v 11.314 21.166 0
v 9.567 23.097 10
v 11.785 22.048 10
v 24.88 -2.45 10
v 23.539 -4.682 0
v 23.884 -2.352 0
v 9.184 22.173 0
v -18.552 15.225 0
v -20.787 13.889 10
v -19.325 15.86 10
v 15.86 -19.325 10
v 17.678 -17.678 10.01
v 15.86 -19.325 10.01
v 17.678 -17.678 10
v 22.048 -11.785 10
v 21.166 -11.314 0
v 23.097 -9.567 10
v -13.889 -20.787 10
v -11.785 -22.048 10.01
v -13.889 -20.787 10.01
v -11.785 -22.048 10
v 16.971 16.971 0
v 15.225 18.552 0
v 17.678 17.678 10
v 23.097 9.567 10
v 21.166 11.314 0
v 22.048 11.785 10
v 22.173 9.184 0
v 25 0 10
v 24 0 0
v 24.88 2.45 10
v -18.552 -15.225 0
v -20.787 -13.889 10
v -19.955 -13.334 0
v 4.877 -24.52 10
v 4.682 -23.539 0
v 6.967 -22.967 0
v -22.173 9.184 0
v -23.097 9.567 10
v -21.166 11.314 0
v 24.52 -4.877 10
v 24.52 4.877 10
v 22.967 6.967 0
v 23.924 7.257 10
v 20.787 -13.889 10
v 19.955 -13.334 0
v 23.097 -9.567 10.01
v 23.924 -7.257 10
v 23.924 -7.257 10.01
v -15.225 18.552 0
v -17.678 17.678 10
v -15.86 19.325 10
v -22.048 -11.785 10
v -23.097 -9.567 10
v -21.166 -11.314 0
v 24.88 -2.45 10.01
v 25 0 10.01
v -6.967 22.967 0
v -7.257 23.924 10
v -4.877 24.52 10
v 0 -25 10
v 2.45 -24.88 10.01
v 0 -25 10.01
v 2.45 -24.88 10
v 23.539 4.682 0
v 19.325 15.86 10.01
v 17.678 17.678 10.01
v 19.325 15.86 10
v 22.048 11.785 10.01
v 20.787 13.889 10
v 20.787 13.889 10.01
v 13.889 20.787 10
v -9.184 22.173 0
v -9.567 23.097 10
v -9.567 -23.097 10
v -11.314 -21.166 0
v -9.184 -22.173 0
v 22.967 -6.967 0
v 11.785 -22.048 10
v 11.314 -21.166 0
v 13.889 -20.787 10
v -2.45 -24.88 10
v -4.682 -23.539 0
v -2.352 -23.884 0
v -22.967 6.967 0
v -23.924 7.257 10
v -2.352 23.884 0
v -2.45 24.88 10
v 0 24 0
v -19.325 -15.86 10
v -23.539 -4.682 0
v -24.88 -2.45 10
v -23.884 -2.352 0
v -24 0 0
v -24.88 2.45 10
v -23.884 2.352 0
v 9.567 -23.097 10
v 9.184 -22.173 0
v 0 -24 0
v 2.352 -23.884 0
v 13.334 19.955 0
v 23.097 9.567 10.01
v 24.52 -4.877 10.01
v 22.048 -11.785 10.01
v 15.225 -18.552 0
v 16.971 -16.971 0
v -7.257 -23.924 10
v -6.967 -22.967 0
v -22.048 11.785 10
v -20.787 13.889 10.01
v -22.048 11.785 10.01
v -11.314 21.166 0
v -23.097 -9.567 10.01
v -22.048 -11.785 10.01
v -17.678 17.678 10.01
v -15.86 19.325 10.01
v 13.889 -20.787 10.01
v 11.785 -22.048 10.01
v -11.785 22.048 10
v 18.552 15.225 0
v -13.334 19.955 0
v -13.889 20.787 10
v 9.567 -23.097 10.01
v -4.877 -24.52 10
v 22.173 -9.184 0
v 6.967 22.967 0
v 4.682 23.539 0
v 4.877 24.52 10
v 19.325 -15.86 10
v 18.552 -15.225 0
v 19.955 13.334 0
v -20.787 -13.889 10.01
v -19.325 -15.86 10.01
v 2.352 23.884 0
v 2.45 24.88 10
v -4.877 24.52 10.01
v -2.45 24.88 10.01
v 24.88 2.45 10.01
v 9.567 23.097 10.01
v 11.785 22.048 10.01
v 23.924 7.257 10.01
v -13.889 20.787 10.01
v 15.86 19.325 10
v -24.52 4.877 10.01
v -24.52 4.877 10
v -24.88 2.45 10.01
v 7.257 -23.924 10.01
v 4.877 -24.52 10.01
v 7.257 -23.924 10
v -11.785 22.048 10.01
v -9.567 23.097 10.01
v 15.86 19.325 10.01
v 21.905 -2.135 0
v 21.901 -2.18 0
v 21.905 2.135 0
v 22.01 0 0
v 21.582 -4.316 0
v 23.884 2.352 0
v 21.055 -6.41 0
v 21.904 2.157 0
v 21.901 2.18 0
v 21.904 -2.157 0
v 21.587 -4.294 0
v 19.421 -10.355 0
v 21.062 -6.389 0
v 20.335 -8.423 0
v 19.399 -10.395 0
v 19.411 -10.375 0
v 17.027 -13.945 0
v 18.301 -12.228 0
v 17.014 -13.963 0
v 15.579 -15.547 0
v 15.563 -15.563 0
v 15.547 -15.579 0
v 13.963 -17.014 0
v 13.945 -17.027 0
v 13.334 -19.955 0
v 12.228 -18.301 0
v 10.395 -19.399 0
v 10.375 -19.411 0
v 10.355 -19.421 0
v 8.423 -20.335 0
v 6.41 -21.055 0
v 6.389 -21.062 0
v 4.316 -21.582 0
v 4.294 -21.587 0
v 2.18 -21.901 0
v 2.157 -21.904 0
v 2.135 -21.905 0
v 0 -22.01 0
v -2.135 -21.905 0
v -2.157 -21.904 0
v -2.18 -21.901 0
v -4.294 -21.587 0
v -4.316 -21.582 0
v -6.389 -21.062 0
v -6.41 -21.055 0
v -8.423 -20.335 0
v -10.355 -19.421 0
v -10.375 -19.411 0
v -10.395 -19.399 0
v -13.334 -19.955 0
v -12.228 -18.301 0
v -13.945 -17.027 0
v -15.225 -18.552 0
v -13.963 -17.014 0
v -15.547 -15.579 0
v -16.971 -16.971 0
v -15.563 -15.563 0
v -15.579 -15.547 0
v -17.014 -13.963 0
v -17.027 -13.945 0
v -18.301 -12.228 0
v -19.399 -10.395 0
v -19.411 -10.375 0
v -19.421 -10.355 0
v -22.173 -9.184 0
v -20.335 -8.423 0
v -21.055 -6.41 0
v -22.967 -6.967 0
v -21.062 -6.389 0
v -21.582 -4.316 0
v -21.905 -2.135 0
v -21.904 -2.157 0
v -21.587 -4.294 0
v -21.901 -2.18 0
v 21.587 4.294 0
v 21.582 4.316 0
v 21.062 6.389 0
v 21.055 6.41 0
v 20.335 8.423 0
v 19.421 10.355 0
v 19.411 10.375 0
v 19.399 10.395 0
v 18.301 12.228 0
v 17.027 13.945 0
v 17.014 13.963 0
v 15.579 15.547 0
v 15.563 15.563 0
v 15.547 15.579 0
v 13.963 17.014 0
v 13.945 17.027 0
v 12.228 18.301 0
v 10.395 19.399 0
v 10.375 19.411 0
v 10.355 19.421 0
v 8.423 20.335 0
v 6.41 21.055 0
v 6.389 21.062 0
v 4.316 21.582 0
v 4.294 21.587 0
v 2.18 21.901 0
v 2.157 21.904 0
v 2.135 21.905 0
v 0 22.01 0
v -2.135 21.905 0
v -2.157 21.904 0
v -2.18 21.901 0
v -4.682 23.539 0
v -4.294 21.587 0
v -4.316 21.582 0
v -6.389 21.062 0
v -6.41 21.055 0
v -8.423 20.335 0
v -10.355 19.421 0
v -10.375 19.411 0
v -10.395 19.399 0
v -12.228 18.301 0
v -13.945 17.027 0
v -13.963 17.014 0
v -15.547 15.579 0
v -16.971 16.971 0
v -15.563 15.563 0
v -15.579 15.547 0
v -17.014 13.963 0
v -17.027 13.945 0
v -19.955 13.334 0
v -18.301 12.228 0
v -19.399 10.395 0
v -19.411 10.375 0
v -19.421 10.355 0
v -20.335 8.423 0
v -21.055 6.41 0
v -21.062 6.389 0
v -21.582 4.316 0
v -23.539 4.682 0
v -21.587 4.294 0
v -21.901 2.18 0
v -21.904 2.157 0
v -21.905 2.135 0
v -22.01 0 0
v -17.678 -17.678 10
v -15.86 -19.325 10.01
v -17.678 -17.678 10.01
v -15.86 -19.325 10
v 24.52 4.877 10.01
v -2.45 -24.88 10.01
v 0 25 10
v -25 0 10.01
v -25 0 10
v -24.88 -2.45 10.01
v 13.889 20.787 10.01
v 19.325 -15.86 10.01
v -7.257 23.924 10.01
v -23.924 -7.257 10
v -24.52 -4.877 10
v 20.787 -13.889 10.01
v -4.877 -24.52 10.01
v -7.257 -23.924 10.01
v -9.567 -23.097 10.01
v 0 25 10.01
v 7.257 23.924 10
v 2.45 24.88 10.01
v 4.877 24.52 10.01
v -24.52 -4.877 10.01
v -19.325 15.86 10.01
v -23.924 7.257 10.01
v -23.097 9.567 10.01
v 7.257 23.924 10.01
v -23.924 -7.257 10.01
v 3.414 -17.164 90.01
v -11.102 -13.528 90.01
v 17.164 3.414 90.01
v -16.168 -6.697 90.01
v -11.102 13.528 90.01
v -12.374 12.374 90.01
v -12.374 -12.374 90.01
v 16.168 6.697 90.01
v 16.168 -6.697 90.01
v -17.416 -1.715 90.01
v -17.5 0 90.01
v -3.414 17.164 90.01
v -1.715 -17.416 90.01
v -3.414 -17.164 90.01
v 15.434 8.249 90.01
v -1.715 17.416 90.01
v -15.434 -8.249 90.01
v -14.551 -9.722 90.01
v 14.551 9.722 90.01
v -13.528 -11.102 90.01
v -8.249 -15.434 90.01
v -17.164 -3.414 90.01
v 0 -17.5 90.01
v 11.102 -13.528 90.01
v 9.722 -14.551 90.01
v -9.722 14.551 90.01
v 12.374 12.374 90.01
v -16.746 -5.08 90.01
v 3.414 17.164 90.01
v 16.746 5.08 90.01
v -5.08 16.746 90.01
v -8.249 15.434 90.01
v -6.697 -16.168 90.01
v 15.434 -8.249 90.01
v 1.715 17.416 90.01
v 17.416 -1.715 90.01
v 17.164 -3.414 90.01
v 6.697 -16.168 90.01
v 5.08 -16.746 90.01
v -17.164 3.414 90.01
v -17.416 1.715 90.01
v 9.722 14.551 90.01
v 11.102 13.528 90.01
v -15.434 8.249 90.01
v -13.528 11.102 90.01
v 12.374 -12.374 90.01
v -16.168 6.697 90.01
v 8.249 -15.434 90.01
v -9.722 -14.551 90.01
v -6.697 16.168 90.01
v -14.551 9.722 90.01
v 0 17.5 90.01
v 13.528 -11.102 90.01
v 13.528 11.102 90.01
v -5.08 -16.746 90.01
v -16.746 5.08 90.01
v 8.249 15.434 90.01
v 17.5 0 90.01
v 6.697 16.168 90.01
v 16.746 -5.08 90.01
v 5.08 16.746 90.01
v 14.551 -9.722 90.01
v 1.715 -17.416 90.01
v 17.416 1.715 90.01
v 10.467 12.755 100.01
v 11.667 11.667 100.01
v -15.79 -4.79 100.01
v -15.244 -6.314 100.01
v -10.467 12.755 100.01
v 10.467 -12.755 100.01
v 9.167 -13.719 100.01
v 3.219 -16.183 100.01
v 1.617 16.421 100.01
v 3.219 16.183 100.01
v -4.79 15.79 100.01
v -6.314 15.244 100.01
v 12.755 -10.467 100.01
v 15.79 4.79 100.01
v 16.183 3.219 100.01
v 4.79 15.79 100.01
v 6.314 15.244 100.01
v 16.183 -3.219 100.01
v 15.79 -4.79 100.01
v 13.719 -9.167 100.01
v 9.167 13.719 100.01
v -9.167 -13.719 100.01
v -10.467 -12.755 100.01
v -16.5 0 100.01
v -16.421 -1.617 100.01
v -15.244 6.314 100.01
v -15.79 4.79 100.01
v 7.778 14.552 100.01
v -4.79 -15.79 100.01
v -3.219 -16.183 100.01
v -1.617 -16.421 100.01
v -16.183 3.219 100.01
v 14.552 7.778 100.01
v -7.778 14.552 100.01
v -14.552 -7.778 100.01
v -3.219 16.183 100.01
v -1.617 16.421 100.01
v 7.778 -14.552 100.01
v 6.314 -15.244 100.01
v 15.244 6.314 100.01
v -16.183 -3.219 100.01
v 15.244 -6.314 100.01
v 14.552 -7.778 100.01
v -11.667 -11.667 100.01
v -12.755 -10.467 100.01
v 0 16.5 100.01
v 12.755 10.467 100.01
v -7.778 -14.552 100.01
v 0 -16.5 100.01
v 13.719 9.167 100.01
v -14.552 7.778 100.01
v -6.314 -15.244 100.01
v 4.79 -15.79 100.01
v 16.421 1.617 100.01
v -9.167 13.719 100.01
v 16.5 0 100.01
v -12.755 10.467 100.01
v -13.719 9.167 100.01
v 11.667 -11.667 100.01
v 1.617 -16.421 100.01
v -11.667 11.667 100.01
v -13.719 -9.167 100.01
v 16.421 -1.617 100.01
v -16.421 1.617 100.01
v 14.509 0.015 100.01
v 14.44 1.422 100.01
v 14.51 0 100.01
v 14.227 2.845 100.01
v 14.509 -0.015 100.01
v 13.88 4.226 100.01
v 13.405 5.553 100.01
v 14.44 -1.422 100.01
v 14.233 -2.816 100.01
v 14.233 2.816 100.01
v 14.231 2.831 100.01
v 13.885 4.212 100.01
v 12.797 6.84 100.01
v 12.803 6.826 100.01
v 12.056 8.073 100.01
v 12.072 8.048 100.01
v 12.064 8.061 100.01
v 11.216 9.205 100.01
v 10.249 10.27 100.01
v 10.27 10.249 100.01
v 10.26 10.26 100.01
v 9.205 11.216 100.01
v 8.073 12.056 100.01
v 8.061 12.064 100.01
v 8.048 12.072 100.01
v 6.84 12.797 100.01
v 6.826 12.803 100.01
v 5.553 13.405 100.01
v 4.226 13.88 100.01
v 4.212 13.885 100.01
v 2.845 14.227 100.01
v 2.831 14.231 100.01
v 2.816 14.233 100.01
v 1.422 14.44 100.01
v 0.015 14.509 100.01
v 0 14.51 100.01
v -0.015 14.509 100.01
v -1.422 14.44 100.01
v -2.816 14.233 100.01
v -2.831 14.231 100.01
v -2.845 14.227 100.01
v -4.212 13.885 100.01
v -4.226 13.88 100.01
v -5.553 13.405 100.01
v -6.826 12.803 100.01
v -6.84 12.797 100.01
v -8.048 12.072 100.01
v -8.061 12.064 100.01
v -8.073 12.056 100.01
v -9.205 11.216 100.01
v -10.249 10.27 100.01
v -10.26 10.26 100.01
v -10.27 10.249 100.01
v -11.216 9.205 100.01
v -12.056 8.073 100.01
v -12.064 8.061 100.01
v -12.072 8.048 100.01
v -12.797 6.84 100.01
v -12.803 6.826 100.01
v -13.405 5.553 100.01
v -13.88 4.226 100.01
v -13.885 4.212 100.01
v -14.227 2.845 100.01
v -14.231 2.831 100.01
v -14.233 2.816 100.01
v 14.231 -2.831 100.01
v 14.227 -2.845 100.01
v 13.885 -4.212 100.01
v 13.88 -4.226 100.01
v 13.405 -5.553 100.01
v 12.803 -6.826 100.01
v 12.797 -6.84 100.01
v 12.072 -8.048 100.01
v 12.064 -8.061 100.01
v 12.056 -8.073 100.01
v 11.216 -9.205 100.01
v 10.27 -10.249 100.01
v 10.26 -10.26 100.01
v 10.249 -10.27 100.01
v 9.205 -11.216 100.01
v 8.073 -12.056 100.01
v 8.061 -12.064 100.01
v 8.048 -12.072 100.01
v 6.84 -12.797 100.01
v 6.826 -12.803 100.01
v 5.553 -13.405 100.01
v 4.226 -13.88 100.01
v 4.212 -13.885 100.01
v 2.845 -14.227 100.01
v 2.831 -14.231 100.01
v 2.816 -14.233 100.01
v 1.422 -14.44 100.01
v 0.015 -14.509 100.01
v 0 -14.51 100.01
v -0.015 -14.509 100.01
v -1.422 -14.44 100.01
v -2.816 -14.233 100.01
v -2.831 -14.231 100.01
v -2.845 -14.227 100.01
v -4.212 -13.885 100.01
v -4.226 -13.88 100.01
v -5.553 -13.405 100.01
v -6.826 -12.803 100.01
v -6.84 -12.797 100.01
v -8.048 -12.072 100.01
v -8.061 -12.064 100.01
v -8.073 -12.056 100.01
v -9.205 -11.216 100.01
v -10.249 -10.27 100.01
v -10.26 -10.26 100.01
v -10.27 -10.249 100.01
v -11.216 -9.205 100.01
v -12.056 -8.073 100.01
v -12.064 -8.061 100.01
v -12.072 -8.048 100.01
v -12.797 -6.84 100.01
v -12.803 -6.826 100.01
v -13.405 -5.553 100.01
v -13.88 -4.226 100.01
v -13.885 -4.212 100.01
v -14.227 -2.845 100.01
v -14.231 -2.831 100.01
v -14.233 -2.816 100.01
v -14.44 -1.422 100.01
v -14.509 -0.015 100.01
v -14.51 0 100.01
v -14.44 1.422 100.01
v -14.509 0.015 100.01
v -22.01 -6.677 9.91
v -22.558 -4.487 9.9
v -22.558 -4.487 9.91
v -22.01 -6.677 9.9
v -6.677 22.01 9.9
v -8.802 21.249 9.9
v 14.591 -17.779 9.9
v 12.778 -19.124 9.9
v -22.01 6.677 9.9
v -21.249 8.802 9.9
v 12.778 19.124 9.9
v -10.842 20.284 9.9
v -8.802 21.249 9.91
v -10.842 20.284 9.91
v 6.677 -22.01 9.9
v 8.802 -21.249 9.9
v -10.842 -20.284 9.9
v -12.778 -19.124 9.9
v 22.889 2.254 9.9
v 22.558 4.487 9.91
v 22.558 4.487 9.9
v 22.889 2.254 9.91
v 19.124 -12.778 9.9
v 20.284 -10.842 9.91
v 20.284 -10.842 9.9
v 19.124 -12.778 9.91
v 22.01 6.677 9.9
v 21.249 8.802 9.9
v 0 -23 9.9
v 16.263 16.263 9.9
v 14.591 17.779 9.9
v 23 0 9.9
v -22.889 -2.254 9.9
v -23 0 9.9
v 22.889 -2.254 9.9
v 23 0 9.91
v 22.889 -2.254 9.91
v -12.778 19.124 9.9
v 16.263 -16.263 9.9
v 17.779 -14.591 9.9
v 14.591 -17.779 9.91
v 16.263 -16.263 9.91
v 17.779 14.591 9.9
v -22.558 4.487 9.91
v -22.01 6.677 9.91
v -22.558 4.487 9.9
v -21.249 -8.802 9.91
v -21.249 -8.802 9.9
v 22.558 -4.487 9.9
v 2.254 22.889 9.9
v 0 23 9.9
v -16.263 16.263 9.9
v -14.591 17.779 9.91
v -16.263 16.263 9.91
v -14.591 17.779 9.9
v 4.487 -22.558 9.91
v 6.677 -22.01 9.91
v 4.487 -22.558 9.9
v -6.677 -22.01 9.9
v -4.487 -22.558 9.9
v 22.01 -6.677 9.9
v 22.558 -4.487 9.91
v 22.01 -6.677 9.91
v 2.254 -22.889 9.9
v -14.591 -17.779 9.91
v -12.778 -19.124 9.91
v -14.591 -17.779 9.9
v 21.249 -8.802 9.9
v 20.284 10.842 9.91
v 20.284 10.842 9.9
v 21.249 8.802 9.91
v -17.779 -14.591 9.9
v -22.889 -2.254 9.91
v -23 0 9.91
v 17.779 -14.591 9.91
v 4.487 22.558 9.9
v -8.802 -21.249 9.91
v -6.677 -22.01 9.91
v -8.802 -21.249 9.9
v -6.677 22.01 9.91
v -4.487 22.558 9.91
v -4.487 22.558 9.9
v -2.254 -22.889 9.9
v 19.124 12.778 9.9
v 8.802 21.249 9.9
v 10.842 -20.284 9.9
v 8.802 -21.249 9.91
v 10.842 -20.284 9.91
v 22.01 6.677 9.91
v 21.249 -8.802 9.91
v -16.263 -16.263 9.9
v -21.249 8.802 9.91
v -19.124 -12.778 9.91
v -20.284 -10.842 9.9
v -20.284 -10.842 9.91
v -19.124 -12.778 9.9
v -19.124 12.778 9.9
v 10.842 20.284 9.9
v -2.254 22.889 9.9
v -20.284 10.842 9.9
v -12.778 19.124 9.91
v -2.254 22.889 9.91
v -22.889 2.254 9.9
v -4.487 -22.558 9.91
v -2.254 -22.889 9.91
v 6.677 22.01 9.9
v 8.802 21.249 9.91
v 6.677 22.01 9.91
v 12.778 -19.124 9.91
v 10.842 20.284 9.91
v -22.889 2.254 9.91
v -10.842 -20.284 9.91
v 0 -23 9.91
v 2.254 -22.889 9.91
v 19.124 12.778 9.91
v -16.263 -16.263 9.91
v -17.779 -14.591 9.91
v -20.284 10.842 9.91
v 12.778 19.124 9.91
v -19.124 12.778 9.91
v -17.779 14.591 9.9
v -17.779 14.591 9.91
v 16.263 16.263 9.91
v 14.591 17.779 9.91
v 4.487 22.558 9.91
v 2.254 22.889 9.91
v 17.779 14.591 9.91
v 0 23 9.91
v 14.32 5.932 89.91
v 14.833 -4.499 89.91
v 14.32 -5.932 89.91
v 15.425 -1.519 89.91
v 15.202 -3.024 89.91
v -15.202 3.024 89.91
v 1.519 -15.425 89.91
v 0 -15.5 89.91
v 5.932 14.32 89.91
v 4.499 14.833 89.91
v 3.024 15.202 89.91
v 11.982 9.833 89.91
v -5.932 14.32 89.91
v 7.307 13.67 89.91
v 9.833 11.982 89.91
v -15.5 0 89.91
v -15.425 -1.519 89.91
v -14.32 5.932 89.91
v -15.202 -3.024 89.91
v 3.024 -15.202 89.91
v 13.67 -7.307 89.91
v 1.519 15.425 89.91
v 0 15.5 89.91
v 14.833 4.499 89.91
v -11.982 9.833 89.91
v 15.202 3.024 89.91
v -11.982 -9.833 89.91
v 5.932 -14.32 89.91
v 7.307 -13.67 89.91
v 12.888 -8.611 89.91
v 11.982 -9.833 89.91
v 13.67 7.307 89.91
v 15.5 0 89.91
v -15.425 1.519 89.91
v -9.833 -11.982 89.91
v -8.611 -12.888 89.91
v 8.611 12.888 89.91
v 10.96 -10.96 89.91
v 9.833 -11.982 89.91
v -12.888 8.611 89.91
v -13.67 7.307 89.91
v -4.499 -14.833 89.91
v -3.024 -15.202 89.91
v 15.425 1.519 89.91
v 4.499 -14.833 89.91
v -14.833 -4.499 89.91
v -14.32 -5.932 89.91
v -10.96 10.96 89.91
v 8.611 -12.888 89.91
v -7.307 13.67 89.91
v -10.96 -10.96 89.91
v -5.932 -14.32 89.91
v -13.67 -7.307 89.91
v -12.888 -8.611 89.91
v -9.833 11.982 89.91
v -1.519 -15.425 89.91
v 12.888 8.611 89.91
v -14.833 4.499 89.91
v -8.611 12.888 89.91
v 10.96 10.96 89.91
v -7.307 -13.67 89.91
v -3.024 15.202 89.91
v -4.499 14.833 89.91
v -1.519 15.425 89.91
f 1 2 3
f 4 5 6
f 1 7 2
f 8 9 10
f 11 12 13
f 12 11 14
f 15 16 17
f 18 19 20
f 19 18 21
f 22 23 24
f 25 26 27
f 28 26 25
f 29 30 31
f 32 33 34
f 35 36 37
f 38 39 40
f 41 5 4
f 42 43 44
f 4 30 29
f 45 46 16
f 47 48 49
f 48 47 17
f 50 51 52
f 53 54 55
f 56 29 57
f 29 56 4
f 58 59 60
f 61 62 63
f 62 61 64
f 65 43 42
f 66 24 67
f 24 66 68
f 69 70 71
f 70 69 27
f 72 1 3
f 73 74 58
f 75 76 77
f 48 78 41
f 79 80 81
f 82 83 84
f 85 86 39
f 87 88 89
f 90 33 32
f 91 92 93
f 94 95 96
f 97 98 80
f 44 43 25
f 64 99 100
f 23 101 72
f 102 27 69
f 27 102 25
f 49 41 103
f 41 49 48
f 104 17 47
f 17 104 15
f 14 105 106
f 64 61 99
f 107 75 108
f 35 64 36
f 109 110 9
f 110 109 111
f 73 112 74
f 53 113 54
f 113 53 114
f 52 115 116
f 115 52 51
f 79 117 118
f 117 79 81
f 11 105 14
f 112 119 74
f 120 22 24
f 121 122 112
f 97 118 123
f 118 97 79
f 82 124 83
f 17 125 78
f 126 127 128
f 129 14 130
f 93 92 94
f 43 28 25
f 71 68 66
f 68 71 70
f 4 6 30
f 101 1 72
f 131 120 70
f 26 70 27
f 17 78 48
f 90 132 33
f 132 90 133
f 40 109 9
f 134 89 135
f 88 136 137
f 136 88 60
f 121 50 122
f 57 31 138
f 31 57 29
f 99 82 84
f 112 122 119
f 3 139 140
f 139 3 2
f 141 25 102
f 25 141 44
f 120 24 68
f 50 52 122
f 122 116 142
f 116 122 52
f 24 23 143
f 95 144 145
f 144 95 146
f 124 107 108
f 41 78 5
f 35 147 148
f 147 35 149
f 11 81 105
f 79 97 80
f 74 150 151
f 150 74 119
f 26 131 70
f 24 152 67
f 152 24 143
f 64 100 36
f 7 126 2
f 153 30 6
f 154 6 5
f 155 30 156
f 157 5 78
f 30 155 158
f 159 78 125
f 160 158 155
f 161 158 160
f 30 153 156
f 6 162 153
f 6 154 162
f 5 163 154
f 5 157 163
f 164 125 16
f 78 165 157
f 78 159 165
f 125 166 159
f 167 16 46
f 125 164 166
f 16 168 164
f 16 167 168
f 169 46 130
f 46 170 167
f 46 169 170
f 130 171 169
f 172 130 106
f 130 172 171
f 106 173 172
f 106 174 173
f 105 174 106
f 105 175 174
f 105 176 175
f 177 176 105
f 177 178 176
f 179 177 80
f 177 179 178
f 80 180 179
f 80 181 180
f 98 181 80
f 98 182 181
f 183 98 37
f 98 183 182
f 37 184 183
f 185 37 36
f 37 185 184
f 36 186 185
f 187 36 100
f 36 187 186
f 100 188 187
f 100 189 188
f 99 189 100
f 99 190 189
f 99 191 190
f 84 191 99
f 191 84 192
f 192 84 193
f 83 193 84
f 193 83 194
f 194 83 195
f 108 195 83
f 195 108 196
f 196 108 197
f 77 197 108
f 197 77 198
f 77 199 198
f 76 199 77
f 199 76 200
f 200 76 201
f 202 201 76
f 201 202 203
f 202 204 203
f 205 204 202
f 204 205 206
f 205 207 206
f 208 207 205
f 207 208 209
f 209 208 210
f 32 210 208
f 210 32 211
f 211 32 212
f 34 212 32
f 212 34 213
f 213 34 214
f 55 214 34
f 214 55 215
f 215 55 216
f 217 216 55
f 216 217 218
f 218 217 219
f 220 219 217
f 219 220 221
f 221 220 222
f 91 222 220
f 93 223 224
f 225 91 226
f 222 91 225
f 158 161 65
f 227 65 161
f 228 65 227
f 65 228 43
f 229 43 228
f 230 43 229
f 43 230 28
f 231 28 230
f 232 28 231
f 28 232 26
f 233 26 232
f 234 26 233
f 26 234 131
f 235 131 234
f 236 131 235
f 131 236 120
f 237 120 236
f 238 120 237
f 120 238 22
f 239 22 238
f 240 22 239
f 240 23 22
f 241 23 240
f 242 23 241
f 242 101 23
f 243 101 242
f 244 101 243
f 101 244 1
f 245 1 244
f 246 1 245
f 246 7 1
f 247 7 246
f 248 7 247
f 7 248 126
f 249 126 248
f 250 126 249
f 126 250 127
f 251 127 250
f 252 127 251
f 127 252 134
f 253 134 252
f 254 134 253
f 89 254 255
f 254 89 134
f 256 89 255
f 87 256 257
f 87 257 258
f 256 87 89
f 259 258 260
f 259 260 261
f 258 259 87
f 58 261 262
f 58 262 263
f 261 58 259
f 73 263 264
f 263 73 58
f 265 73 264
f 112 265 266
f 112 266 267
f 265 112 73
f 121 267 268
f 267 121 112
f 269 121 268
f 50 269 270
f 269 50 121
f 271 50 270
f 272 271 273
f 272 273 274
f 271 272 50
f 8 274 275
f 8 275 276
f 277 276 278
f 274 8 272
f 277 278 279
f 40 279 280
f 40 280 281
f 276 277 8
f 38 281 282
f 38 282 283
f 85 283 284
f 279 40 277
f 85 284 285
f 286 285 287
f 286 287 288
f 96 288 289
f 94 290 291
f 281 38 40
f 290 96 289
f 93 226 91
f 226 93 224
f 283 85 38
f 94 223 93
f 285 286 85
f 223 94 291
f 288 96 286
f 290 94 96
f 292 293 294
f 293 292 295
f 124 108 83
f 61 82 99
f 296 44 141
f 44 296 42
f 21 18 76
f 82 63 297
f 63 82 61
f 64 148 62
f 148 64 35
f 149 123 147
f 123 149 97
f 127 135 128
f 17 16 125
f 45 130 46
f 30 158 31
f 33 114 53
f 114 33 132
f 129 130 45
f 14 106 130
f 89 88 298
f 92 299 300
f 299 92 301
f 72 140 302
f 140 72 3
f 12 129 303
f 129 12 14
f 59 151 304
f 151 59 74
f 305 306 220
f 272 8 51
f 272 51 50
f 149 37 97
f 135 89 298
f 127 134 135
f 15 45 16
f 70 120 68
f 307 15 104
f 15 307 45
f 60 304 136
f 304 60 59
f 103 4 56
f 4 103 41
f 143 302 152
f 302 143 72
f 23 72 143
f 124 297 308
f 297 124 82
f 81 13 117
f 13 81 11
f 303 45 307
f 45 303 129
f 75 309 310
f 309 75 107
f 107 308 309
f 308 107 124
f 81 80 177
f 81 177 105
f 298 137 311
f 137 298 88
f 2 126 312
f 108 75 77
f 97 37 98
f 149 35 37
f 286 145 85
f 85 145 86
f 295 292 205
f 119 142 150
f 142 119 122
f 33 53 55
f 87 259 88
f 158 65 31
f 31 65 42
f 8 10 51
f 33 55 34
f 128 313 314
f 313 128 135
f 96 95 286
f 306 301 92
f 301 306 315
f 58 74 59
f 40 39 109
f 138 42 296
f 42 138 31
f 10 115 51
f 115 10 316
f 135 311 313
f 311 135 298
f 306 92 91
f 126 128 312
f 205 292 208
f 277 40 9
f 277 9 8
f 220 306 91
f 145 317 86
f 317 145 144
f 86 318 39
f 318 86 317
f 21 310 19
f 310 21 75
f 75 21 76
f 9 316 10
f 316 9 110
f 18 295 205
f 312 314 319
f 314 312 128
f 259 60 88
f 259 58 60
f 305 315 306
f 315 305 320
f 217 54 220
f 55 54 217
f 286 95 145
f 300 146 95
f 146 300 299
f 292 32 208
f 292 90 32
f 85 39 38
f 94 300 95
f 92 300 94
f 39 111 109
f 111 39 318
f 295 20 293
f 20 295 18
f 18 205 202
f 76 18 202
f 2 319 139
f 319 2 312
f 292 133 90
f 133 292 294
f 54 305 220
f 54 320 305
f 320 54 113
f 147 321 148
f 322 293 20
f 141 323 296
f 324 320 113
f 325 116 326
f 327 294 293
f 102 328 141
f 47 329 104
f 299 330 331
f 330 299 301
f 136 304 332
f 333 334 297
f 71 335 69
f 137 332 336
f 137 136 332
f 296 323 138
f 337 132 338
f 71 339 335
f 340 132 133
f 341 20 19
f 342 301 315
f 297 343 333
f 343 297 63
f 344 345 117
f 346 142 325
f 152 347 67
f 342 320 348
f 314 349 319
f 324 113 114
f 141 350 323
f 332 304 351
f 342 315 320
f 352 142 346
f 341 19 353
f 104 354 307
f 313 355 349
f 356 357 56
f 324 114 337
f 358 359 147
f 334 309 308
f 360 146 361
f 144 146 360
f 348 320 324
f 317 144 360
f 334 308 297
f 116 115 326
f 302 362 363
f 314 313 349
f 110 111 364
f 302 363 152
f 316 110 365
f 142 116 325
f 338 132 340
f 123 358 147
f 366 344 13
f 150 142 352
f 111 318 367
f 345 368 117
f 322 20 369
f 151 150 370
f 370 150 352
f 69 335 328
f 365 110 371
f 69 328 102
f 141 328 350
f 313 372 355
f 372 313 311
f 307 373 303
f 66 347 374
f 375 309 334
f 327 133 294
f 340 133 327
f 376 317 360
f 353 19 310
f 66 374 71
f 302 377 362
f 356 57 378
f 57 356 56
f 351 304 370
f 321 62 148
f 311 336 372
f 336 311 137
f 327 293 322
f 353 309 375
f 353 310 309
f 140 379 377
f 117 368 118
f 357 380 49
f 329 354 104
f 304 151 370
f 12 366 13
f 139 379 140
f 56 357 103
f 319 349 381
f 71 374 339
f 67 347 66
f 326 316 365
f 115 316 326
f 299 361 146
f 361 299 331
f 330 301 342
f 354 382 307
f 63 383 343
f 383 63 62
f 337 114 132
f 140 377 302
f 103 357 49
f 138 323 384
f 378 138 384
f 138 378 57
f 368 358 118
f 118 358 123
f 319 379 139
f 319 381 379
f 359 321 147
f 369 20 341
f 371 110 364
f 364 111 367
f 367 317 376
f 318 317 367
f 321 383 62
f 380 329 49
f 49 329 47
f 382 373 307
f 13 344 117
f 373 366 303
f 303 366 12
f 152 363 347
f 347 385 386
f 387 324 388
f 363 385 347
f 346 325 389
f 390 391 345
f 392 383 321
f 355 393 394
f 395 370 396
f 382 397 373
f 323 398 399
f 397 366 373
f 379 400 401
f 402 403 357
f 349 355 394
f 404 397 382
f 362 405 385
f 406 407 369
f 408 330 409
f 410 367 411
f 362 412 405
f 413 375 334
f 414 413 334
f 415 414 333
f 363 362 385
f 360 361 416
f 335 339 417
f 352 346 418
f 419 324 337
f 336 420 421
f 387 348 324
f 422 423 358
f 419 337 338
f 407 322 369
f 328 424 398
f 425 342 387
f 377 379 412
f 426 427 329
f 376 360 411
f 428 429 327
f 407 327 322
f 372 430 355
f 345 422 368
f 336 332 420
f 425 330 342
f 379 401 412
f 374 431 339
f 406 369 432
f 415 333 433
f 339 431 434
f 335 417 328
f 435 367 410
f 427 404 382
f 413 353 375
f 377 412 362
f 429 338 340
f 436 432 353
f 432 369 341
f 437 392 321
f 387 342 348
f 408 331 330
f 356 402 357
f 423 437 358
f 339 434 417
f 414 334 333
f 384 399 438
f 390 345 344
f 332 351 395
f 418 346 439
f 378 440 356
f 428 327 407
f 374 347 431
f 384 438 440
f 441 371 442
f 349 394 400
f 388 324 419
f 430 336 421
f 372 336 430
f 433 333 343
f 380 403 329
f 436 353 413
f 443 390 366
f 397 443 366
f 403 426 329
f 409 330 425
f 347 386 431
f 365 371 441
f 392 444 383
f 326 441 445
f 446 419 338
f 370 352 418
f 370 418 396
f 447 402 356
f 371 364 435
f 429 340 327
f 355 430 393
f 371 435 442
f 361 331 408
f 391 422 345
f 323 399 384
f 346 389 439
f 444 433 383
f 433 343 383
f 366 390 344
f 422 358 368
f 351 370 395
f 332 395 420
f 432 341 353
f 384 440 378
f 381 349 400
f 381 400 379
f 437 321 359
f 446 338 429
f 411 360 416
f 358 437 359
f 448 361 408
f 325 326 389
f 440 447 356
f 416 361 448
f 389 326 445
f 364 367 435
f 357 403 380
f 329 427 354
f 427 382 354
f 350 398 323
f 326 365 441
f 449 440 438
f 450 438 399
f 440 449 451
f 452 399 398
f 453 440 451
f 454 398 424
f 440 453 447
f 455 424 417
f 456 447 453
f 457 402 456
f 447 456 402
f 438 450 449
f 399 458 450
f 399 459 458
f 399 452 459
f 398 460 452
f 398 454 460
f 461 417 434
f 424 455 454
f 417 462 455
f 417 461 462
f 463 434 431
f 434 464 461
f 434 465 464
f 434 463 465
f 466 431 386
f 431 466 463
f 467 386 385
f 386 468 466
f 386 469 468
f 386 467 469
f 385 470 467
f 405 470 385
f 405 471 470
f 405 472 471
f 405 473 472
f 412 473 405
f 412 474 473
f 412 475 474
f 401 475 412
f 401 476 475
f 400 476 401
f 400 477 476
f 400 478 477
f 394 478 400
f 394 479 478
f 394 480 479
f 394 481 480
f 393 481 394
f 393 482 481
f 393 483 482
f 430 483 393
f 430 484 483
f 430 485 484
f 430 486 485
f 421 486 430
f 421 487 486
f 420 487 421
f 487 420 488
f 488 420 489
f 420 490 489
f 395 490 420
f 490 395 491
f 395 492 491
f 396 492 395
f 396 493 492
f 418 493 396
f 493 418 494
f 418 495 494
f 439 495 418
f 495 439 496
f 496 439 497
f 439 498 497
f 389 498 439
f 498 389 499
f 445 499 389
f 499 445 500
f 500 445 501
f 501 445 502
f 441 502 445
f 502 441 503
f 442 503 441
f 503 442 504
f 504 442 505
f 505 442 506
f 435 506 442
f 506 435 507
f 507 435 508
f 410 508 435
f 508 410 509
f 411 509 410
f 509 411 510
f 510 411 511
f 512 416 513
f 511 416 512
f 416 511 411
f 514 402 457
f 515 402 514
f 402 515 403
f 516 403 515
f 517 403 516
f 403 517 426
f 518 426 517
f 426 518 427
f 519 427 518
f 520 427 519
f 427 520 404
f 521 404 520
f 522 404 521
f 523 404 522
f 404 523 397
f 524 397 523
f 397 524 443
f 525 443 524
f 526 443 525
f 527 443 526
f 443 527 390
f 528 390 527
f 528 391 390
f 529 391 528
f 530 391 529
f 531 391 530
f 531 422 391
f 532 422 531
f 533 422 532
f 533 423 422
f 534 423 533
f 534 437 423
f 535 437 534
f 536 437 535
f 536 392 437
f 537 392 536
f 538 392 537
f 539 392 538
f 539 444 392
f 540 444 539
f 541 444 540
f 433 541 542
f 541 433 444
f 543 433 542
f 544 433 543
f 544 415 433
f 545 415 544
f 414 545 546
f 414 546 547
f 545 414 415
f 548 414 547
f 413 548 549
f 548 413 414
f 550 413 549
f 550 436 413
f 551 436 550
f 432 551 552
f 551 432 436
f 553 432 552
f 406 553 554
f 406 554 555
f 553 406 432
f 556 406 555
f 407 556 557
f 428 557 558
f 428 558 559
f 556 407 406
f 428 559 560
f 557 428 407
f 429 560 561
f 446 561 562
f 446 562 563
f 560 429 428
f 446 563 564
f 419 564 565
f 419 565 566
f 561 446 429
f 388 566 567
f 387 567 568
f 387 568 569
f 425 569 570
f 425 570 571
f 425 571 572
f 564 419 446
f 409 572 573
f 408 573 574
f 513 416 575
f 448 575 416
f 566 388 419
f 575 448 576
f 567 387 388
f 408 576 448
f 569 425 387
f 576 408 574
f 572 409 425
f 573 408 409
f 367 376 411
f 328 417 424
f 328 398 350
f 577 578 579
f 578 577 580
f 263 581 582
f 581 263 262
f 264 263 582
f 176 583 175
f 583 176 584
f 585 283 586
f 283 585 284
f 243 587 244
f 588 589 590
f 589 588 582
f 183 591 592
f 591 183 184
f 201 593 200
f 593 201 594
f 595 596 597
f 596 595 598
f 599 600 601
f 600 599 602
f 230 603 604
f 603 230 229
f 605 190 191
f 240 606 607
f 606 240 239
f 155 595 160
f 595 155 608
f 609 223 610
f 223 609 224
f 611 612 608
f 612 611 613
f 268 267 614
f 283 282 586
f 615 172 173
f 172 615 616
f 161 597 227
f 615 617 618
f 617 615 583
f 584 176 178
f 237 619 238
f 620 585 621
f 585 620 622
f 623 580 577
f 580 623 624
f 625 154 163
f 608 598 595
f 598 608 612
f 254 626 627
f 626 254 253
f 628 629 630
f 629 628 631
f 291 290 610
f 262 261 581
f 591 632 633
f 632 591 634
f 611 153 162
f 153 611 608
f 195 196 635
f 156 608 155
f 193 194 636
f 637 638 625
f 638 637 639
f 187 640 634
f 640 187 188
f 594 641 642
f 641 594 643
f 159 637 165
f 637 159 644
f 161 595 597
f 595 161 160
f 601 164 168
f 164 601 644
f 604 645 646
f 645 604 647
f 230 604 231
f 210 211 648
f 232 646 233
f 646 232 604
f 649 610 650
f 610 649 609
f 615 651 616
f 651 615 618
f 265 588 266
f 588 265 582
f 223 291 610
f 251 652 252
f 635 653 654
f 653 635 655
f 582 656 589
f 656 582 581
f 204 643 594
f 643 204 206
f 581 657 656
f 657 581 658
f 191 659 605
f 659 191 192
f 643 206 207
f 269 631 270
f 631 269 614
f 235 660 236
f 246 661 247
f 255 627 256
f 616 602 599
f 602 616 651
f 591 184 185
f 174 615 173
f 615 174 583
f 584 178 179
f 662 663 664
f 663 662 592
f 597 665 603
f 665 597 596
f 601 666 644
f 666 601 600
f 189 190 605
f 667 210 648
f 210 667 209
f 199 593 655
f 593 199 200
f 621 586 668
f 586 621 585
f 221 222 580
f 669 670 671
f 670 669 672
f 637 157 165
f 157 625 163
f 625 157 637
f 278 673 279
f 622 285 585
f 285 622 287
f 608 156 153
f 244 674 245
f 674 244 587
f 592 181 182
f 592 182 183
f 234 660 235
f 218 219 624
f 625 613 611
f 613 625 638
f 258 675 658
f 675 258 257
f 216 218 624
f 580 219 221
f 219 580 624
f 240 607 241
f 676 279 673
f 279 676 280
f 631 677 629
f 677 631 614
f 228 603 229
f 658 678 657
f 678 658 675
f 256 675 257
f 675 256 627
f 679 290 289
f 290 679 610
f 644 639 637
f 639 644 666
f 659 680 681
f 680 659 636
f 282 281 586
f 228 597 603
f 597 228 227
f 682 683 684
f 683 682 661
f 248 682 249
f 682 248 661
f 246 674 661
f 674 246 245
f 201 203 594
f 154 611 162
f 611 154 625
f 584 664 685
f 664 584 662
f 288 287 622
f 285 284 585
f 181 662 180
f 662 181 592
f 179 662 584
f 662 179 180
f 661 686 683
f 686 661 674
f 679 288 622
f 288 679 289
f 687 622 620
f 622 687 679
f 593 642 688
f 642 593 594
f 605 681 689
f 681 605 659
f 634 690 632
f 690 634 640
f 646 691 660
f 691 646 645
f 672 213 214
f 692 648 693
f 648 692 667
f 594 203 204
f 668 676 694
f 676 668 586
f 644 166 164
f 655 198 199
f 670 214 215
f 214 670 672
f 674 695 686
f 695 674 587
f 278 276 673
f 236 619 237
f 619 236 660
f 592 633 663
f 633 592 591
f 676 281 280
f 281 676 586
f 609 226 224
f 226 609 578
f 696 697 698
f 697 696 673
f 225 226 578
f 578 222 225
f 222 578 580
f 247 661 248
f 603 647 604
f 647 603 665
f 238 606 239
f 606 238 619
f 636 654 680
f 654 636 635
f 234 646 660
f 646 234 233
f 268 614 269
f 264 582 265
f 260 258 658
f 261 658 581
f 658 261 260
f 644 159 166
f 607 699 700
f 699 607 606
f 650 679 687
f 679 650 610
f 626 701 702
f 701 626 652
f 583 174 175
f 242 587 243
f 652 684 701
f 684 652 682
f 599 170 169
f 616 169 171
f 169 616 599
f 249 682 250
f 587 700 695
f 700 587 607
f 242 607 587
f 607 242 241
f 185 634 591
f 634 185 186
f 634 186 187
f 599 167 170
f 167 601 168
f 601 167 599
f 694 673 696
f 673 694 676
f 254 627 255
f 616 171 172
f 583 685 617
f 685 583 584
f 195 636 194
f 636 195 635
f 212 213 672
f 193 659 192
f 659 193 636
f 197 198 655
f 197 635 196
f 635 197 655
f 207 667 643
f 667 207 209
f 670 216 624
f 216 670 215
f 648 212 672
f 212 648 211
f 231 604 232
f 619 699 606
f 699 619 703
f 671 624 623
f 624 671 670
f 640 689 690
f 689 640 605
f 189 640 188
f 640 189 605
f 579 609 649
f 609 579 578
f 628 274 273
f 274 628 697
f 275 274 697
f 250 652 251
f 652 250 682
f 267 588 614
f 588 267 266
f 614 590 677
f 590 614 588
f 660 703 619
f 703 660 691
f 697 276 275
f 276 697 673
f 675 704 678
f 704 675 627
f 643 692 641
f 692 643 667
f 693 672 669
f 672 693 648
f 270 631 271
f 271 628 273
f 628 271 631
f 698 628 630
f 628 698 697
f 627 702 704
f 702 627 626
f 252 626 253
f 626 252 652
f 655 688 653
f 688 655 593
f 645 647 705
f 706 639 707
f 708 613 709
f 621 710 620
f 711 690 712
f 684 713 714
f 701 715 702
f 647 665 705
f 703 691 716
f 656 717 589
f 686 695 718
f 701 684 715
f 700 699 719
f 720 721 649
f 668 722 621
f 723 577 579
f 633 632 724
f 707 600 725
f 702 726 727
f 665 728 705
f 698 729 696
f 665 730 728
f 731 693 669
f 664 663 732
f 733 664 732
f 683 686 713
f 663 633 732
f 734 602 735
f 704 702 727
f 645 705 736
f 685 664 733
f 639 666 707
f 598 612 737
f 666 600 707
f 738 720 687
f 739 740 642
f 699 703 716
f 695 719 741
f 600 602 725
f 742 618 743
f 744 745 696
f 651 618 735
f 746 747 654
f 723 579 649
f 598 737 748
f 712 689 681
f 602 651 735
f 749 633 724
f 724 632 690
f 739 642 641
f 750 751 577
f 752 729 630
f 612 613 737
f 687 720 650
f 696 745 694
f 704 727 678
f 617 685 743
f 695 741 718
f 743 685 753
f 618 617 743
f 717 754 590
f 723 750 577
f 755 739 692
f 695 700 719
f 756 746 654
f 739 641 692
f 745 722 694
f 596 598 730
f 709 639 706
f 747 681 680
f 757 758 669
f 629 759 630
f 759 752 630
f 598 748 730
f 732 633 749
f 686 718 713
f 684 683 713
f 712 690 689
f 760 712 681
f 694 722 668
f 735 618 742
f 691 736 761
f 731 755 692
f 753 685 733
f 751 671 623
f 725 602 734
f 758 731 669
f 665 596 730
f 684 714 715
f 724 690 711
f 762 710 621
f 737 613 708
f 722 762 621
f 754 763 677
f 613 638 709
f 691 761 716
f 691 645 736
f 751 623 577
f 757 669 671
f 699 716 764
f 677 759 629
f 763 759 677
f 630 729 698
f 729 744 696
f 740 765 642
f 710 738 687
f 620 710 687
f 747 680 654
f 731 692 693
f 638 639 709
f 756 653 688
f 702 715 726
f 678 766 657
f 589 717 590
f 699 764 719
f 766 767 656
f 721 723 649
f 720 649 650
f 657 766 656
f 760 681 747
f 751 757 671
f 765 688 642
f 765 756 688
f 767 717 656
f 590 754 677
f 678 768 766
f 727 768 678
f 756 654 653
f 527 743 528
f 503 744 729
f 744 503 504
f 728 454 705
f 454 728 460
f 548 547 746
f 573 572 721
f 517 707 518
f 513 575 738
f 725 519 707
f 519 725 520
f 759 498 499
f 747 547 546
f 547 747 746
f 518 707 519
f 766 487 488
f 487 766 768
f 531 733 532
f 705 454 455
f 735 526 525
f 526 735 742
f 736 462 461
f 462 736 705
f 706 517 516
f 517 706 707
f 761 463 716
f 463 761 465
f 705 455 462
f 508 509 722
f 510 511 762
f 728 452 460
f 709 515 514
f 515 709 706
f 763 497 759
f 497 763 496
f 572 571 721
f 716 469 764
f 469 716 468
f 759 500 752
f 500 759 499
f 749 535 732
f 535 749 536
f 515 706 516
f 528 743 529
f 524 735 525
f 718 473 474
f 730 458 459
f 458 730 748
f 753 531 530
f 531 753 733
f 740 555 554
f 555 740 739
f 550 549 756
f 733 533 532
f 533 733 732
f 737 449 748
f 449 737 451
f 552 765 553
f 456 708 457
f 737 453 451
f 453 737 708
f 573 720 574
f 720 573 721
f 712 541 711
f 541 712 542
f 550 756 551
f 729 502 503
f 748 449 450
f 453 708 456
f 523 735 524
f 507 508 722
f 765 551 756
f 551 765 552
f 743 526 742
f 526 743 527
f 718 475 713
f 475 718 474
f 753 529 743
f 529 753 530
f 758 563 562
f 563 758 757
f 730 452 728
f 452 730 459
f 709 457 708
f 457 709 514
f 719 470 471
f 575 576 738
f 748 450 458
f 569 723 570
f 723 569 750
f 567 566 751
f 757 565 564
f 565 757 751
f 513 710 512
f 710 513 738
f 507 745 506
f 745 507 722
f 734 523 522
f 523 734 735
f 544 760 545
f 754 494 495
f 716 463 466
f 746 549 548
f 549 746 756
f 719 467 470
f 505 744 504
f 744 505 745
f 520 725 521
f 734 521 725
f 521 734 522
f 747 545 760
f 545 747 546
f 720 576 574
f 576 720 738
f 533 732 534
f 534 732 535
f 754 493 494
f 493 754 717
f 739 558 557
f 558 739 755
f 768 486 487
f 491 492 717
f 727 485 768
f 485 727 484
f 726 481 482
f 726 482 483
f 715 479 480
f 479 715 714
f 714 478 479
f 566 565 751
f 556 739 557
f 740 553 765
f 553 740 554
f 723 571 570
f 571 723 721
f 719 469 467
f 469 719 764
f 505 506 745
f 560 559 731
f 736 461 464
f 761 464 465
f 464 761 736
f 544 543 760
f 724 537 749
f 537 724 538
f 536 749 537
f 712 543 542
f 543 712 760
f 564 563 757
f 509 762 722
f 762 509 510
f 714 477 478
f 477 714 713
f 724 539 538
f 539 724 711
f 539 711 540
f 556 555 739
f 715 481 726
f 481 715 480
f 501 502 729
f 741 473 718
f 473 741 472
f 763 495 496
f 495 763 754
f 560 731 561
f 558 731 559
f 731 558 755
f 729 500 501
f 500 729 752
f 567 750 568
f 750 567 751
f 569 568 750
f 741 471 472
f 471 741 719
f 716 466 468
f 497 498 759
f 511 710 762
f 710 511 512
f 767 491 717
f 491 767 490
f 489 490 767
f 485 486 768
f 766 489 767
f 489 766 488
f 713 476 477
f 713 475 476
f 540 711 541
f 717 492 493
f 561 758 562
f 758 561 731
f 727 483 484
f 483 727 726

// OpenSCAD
// =====================================
// Vacuum Hose Adapter
// 50mm OD spigot end → 35mm OD spigot end (both ends male)
// Total length 100mm, 2mm walls
// =====================================

$fn = 64;

// ---- Parameters (mm) ----
total_length = 100;
tip_length   = 10;  // taper zone at each end

wall = 2;

// Z breakpoints
z_large_tip  = 0;
z_large_body = tip_length;
z_small_body = total_length - tip_length;
z_small_tip  = total_length;

// Outer diameters at each Z breakpoint
od_large_body = 50;
od_small_body = 35;
od_large_tip  = od_large_body - 2;  // 2mm narrower than body to aid insertion
od_small_tip  = od_small_body - 2;  // 2mm narrower than body to aid insertion

// Inner diameters (2mm wall on each side → -4mm)
id_large_tip  = od_large_tip  - 2*wall;
id_large_body = od_large_body - 2*wall;
id_small_body = od_small_body - 2*wall;
id_small_tip  = od_small_tip  - 2*wall;

// ---- Helpers ----
module disc(d, h = 0.01) {
    cylinder(d = d, h = h);
}

module taper_segment(d1, d2, z1, z2) {
    hull() {
        translate([0, 0, z1]) disc(d1);
        translate([0, 0, z2]) disc(d2);
    }
}

// ---- Outer shell ----
module outer_shell() {
    taper_segment(od_large_tip,  od_large_body, z_large_tip,  z_large_body);
    taper_segment(od_large_body, od_small_body, z_large_body, z_small_body);
    taper_segment(od_small_body, od_small_tip,  z_small_body, z_small_tip);
}

// ---- Inner bore ----
module inner_bore() {
    taper_segment(id_large_tip,  id_large_body, z_large_tip,  z_large_body);
    taper_segment(id_large_body, id_small_body, z_large_body, z_small_body);
    taper_segment(id_small_body, id_small_tip,  z_small_body, z_small_tip + 0.2);
}

// ---- Assembly ----
difference() {
    outer_shell();
    translate([0, 0, -0.1]) inner_bore();
}
